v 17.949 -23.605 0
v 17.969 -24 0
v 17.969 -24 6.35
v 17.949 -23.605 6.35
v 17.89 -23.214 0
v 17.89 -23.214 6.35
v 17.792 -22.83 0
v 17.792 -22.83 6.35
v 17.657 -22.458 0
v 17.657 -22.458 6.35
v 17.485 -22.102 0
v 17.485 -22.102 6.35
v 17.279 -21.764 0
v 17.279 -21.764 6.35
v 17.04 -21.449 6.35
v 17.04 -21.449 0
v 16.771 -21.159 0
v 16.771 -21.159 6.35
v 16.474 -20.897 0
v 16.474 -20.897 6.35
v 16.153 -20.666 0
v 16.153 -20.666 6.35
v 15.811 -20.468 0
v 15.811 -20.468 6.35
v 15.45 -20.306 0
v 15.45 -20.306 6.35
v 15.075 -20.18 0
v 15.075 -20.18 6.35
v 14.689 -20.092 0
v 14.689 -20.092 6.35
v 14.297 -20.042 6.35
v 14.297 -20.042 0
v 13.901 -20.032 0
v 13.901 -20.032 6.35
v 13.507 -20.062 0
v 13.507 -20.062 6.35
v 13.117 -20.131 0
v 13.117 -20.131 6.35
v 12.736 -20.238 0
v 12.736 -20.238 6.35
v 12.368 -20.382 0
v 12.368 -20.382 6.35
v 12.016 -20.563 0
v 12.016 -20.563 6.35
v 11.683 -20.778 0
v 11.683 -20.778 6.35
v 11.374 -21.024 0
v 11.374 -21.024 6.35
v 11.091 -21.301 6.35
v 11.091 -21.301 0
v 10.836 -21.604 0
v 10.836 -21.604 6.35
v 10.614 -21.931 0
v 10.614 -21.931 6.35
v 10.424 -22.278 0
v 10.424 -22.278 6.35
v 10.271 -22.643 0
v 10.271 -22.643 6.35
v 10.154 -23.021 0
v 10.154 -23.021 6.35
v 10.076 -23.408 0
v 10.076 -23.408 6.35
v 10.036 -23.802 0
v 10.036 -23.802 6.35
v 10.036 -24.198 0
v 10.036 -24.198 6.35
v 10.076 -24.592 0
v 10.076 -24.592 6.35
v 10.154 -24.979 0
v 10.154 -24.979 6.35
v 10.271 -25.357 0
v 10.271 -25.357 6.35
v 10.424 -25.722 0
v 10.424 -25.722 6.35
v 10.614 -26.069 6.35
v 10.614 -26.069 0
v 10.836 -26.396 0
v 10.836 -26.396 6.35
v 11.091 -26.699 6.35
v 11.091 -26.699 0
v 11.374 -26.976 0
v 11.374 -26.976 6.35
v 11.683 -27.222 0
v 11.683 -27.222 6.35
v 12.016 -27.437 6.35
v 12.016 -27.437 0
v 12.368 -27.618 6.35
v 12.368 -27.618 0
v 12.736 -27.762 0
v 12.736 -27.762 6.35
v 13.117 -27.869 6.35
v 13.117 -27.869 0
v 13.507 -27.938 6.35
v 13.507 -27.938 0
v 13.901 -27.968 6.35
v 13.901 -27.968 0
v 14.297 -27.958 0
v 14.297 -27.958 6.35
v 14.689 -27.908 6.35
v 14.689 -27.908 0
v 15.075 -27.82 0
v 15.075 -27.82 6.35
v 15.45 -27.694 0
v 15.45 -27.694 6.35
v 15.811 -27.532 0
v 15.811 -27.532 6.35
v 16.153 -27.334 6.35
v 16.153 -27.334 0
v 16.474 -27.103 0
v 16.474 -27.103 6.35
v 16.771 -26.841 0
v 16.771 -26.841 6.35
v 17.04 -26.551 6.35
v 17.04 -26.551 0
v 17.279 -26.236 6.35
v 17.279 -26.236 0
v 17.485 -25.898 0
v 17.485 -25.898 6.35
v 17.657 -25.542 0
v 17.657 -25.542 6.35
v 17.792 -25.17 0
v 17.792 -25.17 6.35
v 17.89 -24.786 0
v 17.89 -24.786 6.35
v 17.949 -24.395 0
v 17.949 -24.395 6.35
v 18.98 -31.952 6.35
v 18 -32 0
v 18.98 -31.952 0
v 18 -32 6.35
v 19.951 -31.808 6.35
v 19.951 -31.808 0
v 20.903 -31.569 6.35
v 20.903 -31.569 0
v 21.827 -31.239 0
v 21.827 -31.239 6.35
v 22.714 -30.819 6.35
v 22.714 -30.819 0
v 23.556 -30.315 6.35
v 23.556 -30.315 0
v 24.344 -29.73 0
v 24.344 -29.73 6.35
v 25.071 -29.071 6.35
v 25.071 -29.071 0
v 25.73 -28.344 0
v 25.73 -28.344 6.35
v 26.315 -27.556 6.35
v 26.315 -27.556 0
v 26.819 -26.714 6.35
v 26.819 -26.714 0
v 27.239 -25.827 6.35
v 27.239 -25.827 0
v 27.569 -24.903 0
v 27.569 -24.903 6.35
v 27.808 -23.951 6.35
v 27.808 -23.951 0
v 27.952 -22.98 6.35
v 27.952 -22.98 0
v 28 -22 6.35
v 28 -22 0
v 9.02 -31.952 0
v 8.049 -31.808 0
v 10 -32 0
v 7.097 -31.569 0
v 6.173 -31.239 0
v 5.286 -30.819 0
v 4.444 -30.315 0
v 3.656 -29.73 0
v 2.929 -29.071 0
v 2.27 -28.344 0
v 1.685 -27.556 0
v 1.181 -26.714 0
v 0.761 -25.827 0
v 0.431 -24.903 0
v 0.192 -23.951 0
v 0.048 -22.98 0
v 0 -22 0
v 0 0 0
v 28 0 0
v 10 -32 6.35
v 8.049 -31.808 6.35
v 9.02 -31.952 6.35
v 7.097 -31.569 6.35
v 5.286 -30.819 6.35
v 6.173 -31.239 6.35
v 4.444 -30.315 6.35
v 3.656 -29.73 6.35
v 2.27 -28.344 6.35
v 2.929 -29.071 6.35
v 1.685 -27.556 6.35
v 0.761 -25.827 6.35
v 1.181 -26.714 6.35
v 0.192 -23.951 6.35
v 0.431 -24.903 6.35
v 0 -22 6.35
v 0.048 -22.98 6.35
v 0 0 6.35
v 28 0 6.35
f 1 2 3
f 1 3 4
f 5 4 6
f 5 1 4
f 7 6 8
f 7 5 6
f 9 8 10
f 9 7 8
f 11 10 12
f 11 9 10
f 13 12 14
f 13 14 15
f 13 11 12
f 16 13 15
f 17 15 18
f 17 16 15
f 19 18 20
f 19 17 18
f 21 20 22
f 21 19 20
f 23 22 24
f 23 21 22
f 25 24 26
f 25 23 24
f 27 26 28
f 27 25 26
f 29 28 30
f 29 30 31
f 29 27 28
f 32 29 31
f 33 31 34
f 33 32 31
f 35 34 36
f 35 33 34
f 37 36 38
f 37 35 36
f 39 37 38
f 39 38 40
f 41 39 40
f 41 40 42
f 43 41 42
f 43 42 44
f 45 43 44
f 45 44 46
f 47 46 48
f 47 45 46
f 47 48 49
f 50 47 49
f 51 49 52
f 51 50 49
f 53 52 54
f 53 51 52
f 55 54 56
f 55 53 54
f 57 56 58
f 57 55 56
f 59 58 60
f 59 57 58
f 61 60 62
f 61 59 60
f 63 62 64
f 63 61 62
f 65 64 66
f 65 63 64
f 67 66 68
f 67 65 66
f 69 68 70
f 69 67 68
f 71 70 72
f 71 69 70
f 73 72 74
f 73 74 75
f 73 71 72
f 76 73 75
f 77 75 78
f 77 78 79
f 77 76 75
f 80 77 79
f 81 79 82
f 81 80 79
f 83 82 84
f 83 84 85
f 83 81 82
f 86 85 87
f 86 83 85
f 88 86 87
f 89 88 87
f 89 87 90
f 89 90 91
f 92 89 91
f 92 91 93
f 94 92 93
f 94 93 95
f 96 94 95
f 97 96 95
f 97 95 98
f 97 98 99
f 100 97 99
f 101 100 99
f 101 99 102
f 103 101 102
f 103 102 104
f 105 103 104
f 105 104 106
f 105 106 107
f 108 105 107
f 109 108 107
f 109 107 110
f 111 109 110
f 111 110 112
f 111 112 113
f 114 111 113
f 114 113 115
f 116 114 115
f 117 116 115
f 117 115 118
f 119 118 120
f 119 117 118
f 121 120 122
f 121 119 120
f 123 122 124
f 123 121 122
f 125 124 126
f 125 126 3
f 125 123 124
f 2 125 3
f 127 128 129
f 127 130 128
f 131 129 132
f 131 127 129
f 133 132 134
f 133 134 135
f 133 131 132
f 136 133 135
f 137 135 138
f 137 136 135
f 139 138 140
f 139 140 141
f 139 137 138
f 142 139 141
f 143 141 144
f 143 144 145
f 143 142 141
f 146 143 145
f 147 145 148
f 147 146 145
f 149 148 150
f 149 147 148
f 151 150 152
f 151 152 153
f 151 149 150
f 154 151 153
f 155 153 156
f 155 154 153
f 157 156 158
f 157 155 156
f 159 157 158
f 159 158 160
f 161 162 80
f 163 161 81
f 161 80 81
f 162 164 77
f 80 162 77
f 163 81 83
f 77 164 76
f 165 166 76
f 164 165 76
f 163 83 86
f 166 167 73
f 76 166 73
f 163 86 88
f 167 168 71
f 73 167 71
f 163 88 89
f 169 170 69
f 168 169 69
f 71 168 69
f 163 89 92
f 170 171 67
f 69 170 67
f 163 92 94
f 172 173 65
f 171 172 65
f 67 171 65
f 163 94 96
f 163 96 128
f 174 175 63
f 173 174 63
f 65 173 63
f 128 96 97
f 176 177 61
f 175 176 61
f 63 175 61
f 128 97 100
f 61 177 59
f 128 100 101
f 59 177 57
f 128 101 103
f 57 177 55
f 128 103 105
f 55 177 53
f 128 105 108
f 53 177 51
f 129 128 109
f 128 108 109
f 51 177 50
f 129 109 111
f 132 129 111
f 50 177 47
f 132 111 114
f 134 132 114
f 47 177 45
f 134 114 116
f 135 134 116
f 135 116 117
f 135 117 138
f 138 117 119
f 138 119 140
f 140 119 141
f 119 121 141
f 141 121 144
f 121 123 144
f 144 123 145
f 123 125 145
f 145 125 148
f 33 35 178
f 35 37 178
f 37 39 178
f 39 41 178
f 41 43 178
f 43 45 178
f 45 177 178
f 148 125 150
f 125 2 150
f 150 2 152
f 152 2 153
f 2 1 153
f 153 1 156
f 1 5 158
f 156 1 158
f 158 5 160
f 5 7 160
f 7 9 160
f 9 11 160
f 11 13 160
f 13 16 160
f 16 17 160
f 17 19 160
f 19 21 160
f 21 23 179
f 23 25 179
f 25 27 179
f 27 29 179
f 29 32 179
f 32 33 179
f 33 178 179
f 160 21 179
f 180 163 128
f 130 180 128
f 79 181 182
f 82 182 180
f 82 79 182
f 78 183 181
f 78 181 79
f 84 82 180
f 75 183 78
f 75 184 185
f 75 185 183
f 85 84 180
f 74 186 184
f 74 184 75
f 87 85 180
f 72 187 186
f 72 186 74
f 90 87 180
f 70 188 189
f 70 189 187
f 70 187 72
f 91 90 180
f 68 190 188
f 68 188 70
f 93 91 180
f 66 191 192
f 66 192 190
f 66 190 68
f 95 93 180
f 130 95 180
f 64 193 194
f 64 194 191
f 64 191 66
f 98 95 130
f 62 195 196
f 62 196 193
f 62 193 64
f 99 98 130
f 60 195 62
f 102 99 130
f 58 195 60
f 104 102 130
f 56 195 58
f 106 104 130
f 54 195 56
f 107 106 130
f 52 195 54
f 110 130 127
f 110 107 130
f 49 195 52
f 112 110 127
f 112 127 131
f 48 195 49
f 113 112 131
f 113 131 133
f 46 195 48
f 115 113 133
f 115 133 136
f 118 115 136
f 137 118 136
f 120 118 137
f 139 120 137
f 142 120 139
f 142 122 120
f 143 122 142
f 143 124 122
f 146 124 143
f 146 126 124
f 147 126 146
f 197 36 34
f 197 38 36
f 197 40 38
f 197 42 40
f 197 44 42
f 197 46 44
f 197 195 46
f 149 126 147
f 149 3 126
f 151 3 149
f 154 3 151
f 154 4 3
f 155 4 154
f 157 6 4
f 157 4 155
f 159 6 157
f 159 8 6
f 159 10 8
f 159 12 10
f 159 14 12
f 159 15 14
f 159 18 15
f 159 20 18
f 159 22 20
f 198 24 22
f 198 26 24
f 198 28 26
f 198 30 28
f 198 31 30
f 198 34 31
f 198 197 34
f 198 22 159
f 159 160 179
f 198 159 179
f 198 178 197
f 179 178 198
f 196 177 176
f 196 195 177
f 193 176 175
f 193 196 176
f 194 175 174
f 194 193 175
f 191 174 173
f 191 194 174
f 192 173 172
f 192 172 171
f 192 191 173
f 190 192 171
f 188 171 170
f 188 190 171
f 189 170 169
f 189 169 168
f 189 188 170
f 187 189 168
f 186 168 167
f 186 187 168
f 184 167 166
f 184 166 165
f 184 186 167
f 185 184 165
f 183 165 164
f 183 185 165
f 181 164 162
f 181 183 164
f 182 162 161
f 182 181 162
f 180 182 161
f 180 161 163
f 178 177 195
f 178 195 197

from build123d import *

# Parameters (mm, degrees)
CROQUIS1_W              = 28
CROQUIS1_H              = 32
CROQUIS1_R              = 3.96875
SALIENTE_EXTRUIR1_DEPTH = 6.35
REDONDEO1_R             = 10


with BuildPart() as part:
    # Croquis1 → Saliente-Extruir1 (new body)
    with BuildSketch(Plane.XY):
        with Locations((14, -16)):
            Rectangle(CROQUIS1_W, CROQUIS1_H)
        with Locations((14, -24)):
            Circle(CROQUIS1_R, mode=Mode.SUBTRACT)
    extrude(amount=SALIENTE_EXTRUIR1_DEPTH)

    # Redondeo1
    redondeo1_edges = [part.edges().sort_by_distance(p)[0] for p in [
        (28, -32, 3.175),
        (0, -32, 3.175),
    ]]
    fillet(redondeo1_edges, radius=REDONDEO1_R)


solid = part.part
